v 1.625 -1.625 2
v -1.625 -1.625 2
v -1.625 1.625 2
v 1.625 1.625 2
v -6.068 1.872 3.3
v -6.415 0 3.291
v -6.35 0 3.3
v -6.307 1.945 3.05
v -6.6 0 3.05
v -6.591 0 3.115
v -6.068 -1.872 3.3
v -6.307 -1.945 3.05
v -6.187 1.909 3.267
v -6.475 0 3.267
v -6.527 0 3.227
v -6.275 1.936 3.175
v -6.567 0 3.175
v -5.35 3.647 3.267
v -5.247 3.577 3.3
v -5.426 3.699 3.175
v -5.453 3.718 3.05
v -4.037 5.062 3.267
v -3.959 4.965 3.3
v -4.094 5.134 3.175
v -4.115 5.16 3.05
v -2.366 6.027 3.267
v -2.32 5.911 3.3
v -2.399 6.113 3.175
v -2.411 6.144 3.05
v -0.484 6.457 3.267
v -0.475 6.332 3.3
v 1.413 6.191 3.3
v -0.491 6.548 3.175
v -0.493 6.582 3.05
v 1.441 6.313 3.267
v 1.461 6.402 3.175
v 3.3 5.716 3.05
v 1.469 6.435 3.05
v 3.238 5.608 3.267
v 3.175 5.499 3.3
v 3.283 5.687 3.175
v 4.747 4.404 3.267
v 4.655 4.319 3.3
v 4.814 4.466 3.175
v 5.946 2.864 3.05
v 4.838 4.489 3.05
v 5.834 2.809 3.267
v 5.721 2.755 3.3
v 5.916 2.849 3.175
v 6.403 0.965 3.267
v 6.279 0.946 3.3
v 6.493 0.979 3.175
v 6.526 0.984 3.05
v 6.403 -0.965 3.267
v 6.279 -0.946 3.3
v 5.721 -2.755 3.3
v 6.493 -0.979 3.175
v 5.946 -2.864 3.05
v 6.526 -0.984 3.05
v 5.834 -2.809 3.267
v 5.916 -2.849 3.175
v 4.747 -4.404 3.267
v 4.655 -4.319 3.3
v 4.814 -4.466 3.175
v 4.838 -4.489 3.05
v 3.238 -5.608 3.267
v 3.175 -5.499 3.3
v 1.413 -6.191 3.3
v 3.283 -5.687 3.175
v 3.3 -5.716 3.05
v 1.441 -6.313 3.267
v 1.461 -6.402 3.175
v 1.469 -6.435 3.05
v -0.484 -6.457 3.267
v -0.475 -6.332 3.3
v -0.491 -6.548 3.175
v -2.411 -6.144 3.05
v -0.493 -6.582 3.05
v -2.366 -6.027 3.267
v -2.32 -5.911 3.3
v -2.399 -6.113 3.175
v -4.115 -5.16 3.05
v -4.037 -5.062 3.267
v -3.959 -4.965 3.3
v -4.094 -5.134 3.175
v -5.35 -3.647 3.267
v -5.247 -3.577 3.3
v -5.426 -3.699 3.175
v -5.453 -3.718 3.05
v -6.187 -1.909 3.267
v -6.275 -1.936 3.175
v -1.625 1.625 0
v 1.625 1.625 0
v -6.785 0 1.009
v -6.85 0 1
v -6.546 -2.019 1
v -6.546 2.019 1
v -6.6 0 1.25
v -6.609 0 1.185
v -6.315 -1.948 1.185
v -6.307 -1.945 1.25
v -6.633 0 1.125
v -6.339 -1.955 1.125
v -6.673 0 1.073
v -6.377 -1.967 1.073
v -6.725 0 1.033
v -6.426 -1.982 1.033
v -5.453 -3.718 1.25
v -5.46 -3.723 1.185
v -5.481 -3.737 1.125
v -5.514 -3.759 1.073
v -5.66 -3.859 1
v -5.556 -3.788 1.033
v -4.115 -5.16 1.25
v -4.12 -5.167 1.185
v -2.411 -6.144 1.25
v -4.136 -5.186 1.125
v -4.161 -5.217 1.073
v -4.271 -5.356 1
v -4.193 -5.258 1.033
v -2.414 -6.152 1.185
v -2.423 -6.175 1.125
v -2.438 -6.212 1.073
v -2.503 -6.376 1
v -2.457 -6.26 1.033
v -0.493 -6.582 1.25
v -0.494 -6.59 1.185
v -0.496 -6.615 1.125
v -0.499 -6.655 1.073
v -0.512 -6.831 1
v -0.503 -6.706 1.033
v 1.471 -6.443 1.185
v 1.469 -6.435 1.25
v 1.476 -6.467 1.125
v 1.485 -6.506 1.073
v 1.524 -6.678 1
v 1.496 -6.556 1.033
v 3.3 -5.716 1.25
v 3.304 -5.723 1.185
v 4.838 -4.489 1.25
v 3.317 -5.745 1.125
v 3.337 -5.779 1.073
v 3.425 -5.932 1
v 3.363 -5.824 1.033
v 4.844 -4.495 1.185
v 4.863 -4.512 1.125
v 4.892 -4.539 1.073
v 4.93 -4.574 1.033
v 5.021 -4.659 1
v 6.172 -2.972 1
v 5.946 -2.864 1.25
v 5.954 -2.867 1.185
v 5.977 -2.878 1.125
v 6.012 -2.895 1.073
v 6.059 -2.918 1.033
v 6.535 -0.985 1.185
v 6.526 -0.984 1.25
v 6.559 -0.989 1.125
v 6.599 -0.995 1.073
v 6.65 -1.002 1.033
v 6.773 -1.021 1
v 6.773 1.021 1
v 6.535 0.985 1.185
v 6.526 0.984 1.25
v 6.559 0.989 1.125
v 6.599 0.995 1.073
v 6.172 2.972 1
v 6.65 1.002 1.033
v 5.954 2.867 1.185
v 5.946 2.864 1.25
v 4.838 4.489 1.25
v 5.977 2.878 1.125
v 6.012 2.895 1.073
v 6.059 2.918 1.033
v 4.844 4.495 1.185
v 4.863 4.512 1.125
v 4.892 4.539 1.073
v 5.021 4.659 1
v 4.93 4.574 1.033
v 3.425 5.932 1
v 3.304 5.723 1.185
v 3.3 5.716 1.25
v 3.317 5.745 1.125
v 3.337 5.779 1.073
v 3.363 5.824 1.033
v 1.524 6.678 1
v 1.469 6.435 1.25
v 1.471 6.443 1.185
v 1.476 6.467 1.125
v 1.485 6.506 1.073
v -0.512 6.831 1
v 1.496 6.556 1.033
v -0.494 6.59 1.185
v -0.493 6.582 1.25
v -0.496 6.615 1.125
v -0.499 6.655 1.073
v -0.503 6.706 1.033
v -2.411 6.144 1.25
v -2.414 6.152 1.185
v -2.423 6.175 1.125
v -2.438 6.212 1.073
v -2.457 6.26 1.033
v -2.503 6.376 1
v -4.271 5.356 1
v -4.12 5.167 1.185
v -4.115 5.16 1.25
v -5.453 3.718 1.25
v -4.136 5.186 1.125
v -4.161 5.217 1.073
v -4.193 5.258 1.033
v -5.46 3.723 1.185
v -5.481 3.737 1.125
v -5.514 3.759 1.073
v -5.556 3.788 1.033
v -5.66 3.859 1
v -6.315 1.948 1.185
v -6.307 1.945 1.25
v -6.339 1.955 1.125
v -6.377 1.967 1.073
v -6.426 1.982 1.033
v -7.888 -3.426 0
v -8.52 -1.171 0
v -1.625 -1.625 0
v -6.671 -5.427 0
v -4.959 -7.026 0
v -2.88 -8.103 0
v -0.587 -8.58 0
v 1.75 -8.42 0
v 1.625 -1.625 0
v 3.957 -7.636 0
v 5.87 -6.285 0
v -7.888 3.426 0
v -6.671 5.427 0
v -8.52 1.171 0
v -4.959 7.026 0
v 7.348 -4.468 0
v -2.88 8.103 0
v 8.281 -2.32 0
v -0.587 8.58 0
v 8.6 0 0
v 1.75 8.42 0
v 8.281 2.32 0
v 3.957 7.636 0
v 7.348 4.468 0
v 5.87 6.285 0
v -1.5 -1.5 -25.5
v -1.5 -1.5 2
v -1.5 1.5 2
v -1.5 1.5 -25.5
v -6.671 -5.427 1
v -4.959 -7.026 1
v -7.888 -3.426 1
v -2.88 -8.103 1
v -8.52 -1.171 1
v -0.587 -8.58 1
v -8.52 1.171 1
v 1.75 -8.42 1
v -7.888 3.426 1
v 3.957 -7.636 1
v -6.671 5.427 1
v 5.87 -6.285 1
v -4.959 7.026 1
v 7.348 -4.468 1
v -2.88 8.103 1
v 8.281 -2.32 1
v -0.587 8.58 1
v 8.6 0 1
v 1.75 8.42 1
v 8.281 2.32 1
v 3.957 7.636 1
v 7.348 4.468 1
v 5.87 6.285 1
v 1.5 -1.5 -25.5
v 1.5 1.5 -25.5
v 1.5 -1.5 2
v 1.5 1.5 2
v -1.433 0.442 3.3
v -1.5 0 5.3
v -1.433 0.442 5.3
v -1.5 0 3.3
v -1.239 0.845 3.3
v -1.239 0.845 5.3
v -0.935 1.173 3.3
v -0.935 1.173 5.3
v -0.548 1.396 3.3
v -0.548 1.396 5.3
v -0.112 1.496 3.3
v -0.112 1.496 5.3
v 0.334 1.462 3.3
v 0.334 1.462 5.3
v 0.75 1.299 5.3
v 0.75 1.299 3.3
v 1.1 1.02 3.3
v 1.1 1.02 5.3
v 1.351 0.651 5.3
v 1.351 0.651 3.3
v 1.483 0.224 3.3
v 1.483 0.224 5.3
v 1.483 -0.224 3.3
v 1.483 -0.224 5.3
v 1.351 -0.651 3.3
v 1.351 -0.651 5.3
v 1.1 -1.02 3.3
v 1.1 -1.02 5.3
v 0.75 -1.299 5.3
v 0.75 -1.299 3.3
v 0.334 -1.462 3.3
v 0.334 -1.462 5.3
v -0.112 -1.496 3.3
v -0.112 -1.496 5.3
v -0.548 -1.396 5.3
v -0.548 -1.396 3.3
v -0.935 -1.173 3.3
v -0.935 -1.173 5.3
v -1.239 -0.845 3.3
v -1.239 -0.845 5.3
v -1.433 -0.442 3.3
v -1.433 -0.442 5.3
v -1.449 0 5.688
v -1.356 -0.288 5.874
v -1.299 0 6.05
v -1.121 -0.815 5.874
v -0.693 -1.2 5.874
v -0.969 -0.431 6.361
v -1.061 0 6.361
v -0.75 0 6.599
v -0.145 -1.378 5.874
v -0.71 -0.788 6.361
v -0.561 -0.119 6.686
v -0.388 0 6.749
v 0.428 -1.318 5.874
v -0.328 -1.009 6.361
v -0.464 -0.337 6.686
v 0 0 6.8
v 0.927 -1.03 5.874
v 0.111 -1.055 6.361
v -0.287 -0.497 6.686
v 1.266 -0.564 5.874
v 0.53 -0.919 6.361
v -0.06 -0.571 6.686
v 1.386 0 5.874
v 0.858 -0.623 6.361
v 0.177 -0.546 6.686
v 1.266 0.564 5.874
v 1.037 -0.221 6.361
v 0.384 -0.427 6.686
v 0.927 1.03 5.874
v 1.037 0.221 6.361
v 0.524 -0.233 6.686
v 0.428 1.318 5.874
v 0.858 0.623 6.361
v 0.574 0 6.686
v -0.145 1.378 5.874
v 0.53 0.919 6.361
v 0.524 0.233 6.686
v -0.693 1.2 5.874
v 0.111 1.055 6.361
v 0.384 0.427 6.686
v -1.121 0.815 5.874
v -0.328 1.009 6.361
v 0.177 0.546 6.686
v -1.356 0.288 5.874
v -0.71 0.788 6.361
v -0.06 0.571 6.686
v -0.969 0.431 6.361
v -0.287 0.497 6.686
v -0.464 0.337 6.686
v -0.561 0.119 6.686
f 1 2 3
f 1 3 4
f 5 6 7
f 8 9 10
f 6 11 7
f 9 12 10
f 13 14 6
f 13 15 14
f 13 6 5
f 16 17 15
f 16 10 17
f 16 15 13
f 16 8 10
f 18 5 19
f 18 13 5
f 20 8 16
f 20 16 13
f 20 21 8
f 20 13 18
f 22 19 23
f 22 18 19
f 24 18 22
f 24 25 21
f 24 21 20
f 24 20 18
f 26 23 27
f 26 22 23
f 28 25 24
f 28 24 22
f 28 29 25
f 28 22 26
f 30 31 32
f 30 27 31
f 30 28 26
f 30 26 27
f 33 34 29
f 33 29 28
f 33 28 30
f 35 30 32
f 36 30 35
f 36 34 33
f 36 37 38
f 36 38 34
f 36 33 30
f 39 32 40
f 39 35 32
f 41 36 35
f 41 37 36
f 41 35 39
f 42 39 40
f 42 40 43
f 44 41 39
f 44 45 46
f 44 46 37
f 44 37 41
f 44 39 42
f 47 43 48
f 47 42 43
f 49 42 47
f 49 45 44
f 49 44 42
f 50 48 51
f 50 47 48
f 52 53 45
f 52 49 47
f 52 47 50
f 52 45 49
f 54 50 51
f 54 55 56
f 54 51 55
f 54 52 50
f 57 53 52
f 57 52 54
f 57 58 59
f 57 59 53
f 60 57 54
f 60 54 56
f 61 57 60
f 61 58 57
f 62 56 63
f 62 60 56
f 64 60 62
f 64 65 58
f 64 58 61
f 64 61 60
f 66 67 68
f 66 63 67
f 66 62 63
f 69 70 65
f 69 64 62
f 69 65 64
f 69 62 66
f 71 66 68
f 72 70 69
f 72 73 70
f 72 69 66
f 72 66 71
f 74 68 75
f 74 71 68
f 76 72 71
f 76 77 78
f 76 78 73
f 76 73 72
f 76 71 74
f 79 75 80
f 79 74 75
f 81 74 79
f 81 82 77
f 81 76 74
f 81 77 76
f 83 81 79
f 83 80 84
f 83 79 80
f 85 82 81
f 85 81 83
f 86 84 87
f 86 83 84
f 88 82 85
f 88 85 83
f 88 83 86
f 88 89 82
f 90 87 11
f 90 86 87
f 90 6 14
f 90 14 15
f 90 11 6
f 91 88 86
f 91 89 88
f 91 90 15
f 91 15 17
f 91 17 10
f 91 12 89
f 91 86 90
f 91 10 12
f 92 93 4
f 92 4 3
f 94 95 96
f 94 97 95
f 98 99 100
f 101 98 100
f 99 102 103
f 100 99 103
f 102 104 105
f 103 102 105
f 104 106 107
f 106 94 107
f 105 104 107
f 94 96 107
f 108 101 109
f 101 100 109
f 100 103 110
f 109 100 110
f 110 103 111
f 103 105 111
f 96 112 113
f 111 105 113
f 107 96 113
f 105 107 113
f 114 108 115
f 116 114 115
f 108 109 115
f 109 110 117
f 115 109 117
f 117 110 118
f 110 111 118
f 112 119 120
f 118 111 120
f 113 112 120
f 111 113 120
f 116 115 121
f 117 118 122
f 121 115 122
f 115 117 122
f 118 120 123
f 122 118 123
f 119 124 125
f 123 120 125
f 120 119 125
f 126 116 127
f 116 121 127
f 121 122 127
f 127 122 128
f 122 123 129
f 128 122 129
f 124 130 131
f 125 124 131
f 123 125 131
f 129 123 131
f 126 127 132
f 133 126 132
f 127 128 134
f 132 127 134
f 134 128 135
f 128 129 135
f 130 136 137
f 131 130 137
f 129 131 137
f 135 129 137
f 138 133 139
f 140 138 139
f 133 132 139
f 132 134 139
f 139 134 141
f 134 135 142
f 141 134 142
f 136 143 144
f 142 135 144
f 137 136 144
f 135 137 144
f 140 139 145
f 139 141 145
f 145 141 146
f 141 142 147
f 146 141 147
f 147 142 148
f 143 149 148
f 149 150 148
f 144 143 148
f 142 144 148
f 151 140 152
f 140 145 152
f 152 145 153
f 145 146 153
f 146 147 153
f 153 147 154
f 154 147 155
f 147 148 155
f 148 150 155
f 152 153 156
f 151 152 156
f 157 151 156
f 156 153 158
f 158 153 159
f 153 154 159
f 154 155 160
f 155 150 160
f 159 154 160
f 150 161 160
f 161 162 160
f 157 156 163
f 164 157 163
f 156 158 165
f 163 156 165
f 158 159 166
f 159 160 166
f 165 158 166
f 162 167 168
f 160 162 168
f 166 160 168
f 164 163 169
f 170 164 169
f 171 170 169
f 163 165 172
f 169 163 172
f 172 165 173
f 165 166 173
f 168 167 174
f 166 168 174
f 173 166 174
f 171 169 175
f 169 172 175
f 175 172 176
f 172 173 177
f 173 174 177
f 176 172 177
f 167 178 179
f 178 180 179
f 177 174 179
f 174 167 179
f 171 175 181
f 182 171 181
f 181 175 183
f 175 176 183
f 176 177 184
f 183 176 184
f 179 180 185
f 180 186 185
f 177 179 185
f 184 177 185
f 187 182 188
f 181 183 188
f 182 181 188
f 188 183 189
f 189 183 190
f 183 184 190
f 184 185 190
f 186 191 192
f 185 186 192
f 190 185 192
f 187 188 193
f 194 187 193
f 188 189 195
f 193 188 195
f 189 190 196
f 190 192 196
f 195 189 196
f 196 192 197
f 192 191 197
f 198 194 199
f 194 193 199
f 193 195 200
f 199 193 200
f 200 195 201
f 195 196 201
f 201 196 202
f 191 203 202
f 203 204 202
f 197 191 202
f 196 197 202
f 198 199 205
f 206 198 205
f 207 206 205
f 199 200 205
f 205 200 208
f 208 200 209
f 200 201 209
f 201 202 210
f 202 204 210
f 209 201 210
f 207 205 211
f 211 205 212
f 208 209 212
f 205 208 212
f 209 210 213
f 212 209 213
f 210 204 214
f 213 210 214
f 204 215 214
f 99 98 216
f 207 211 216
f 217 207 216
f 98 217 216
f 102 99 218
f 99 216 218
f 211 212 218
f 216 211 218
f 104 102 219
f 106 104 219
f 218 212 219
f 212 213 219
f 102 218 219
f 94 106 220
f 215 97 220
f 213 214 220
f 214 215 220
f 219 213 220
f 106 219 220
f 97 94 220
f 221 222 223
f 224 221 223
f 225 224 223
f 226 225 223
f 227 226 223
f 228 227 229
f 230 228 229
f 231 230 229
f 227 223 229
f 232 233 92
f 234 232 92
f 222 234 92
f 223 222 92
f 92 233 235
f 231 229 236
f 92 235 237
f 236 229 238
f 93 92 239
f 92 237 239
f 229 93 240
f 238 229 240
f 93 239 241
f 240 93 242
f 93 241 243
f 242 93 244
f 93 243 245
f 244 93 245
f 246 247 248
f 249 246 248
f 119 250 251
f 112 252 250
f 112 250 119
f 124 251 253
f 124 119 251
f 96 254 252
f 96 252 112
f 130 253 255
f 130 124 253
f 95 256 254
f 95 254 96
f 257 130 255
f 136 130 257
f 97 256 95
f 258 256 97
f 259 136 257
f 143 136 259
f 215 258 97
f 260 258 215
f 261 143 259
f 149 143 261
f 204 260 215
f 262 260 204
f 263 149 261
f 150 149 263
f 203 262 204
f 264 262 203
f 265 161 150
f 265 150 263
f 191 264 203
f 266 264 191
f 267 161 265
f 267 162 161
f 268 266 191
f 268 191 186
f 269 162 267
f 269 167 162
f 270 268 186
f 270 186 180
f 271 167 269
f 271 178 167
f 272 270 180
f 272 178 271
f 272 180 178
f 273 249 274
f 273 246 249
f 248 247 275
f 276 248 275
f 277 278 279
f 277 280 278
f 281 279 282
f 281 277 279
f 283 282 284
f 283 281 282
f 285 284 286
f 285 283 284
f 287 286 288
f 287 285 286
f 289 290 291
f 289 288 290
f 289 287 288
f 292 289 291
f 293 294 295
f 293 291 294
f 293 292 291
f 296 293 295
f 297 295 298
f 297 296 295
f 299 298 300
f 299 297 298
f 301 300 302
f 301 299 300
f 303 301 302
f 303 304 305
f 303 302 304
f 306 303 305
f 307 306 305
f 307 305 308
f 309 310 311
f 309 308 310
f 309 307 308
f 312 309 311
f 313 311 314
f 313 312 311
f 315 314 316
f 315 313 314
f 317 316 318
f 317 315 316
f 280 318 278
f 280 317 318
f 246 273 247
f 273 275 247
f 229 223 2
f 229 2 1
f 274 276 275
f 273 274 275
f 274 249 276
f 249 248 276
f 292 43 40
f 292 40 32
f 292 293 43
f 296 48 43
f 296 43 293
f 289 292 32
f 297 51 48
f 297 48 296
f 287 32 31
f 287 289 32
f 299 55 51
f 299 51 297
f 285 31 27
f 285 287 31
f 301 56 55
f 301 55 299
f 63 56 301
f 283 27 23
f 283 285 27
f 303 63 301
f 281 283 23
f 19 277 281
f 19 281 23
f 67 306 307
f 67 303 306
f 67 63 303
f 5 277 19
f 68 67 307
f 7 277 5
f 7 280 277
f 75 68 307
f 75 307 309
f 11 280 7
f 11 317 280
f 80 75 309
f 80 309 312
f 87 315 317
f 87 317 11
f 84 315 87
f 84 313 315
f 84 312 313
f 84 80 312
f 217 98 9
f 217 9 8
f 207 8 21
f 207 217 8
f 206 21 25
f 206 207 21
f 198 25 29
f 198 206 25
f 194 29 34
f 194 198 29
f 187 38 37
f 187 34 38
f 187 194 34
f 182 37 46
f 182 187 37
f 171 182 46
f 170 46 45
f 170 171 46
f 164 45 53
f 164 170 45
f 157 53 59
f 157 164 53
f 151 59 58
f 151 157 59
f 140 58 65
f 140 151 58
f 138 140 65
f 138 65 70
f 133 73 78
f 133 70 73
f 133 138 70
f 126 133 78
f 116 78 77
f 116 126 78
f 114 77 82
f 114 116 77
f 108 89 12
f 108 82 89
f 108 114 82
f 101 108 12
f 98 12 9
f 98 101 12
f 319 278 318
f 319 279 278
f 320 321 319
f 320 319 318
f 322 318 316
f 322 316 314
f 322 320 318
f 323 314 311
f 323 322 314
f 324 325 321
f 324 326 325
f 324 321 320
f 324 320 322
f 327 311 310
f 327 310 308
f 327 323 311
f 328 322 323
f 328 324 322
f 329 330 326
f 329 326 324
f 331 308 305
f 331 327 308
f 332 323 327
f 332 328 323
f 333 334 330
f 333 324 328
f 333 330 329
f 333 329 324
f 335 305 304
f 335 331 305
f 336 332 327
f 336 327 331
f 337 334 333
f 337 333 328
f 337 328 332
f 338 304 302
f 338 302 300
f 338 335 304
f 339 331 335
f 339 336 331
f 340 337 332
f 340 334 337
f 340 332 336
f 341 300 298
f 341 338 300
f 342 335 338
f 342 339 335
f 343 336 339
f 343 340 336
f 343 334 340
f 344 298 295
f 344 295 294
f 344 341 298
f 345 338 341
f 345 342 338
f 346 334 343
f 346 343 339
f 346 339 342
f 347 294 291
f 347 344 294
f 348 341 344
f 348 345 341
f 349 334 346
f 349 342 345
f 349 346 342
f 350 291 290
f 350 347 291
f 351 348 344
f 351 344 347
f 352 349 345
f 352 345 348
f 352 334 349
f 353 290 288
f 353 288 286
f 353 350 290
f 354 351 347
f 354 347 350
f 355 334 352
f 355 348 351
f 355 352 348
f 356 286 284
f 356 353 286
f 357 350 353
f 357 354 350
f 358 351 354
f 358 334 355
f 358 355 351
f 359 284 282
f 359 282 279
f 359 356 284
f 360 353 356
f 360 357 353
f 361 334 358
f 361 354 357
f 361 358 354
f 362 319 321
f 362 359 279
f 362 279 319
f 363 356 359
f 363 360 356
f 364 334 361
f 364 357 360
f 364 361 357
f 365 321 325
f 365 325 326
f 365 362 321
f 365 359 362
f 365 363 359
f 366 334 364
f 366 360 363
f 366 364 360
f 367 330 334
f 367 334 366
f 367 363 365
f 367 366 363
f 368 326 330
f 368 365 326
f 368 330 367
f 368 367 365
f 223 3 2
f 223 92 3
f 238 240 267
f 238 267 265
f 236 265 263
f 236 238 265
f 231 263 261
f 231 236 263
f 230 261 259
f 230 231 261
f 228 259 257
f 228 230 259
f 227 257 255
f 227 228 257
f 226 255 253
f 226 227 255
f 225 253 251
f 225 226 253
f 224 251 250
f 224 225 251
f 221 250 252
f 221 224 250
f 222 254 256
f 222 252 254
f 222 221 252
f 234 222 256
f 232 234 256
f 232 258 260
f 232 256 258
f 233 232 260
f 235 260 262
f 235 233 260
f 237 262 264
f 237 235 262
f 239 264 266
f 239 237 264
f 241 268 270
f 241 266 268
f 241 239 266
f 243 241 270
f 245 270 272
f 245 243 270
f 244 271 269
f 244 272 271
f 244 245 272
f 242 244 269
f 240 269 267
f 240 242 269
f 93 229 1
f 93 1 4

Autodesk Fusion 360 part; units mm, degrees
sketch "Sketch1" plane through (0, 0, 0) normal (0, 0, 1) x (1, 0, 0) in component "wheel"
  circle A0 centre (0, 0) radius 8.6
  dimension "d9" = 17.2
extrude "Extrude1" add sketch "Sketch1" along normal blind 1 makes body 1 in component "wheel"
sketch "Sketch2" plane through (0, 0, 1) normal (0, 0, 1) x (-1, 0, 0) in component "wheel"
  circle A0 centre (0, 0) radius 8.6
  circle A1 centre (0, 0) radius 6.6
  dimension "d13" = 13.2
extrude "Extrude2" add sketch "Sketch2" along normal blind 2.3 contours A1 bodies 1 in component "wheel"
sketch "Sketch3" plane through (0, 0, 3.3) normal (0, 0, 1) x (-1, 0, 0) in component "wheel"
  circle A0 centre (0, 0) radius 6.6
  circle A1 centre (0, 0) radius 1.5
  dimension "d16" = 3
extrude "Extrude3" add sketch "Sketch3" along normal blind 3.5 contours A1 bodies 1 in component "wheel"
fillet "Fillet1" radius 1.5 1 edges at (1.3985, 0.5424, 6.8) on bodies 1 in component "wheel"
fillet "Fillet2" radius 0.25 2 edges at (6.1534, -2.3867, 1) (6.1534, 2.3867, 3.3) on bodies 1 in component "wheel"
sketch "Sketch4" plane through (0, 0, 0) normal (0, 0, -1) x (1, 0, 0) in component "wheel"
  circle A0 centre (0, 0) radius 8.6
  line L0 (0.5, -0.5) -> (-0.5, 0.5) construction
  line L1 (-2.0512, -2.0678) -> (2.0552, 2.0719) construction
  circle A1 centre (0, 0) radius 1.5
  dimension "d19" = 3
  dimension "d20" = 3
  dimension "d32" = 3
sketch "Sketch1 (2)" plane through (0, 0, 0) normal (0, 0, -1) x (1, 0, 0)
  circle A0 centre (0, 0) radius 8.6
  line L0 (1.625, -1.625) -> (-1.625, -1.625)
  line L1 (-1.625, -1.625) -> (-1.625, 1.625)
  line L2 (-1.625, 1.625) -> (1.625, 1.625)
  line L3 (1.625, 1.625) -> (1.625, -1.625)
  line L4 (1.625, -1.625) -> (-1.625, 1.625) construction
  line L5 (-1.625, -1.625) -> (1.625, 1.625) construction
  dimension "d33" = 3.25
  dimension "d34" = 3.25
extrude "Extrude6" cut sketch "Sketch1 (2)" against normal blind 2 contours L0 L1 L2 L3 bodies 1 in component "wheel"
sketch "Sketch1 (3)" plane through (0, 0, 2) normal (0, 0, -1) x (1, 0, 0) in component "pin"
  line L0 (1.625, 1.625) -> (-1.625, 1.625)
  line L1 (-1.625, 1.625) -> (-1.625, -1.625)
  line L2 (-1.625, -1.625) -> (1.625, -1.625)
  line L3 (1.625, -1.625) -> (1.625, 1.625)
  line L4 (-1.5, -1.5) -> (1.5, -1.5)
  line L5 (1.5, -1.5) -> (1.5, 1.5)
  line L6 (1.5, 1.5) -> (-1.5, 1.5)
  line L7 (-1.5, 1.5) -> (-1.5, -1.5)
  line L8 (-1.5, -1.5) -> (1.5, 1.5) construction
  line L9 (1.5, -1.5) -> (-1.5, 1.5) construction
  dimension "d40" = 3
  dimension "d41" = 3
extrude "Extrude2'" add sketch "Sketch1 (3)" along normal blind 27.5 separate body contours L4 L5 L6 L7 makes body 2 in component "pin"
component "wheel" placed x (1, 0, 0) y (0, 1, 0) z (0, 0, 1) at (0, 0, 0)
component "pin" placed x (1, 0, 0) y (0, 1, 0) z (0, 0, 1) at (0, 0, 0)
equation "outer_wheel_diameter = 17.2 mm"
equation "outer_lip = 2 mm"
equation "inner_wheel_diameter = 13.2 mm"
equation "inner_wheel_height = 2.3 mm"
equation "peg_diameter = 3 mm"
equation "peg_height = 3.5 mm"
equation "pin_side = 3 mm"
equation "pin_depth = 2 mm"
equation "d9 = outer_wheel_diameter"
equation "outer_wheel_thickness = 1 mm"
equation "d11 = outer_wheel_thickness"
equation "d13 = inner_wheel_diameter"
equation "d14 = inner_wheel_height"
equation "d16 = peg_diameter"
equation "d17 = peg_height"
equation "d19 = pin_side"
equation "d20 = pin_side"
equation "distance_between_wheels = 23.5 mm"
equation "d26 = peg_diameter / 2"
equation "pin_diameter = 3 mm"
equation "d32 = pin_diameter"
equation "d33 = pin_side + wheel_pin_tolerance"
equation "d34 = pin_side + wheel_pin_tolerance"
equation "d35 = -pin_depth"
equation "wheel_pin_tolerance = 0.25 mm"
equation "d40 = pin_side"
equation "d41 = pin_side"
equation "d42 = pin_depth * 2 + distance_between_wheels"
